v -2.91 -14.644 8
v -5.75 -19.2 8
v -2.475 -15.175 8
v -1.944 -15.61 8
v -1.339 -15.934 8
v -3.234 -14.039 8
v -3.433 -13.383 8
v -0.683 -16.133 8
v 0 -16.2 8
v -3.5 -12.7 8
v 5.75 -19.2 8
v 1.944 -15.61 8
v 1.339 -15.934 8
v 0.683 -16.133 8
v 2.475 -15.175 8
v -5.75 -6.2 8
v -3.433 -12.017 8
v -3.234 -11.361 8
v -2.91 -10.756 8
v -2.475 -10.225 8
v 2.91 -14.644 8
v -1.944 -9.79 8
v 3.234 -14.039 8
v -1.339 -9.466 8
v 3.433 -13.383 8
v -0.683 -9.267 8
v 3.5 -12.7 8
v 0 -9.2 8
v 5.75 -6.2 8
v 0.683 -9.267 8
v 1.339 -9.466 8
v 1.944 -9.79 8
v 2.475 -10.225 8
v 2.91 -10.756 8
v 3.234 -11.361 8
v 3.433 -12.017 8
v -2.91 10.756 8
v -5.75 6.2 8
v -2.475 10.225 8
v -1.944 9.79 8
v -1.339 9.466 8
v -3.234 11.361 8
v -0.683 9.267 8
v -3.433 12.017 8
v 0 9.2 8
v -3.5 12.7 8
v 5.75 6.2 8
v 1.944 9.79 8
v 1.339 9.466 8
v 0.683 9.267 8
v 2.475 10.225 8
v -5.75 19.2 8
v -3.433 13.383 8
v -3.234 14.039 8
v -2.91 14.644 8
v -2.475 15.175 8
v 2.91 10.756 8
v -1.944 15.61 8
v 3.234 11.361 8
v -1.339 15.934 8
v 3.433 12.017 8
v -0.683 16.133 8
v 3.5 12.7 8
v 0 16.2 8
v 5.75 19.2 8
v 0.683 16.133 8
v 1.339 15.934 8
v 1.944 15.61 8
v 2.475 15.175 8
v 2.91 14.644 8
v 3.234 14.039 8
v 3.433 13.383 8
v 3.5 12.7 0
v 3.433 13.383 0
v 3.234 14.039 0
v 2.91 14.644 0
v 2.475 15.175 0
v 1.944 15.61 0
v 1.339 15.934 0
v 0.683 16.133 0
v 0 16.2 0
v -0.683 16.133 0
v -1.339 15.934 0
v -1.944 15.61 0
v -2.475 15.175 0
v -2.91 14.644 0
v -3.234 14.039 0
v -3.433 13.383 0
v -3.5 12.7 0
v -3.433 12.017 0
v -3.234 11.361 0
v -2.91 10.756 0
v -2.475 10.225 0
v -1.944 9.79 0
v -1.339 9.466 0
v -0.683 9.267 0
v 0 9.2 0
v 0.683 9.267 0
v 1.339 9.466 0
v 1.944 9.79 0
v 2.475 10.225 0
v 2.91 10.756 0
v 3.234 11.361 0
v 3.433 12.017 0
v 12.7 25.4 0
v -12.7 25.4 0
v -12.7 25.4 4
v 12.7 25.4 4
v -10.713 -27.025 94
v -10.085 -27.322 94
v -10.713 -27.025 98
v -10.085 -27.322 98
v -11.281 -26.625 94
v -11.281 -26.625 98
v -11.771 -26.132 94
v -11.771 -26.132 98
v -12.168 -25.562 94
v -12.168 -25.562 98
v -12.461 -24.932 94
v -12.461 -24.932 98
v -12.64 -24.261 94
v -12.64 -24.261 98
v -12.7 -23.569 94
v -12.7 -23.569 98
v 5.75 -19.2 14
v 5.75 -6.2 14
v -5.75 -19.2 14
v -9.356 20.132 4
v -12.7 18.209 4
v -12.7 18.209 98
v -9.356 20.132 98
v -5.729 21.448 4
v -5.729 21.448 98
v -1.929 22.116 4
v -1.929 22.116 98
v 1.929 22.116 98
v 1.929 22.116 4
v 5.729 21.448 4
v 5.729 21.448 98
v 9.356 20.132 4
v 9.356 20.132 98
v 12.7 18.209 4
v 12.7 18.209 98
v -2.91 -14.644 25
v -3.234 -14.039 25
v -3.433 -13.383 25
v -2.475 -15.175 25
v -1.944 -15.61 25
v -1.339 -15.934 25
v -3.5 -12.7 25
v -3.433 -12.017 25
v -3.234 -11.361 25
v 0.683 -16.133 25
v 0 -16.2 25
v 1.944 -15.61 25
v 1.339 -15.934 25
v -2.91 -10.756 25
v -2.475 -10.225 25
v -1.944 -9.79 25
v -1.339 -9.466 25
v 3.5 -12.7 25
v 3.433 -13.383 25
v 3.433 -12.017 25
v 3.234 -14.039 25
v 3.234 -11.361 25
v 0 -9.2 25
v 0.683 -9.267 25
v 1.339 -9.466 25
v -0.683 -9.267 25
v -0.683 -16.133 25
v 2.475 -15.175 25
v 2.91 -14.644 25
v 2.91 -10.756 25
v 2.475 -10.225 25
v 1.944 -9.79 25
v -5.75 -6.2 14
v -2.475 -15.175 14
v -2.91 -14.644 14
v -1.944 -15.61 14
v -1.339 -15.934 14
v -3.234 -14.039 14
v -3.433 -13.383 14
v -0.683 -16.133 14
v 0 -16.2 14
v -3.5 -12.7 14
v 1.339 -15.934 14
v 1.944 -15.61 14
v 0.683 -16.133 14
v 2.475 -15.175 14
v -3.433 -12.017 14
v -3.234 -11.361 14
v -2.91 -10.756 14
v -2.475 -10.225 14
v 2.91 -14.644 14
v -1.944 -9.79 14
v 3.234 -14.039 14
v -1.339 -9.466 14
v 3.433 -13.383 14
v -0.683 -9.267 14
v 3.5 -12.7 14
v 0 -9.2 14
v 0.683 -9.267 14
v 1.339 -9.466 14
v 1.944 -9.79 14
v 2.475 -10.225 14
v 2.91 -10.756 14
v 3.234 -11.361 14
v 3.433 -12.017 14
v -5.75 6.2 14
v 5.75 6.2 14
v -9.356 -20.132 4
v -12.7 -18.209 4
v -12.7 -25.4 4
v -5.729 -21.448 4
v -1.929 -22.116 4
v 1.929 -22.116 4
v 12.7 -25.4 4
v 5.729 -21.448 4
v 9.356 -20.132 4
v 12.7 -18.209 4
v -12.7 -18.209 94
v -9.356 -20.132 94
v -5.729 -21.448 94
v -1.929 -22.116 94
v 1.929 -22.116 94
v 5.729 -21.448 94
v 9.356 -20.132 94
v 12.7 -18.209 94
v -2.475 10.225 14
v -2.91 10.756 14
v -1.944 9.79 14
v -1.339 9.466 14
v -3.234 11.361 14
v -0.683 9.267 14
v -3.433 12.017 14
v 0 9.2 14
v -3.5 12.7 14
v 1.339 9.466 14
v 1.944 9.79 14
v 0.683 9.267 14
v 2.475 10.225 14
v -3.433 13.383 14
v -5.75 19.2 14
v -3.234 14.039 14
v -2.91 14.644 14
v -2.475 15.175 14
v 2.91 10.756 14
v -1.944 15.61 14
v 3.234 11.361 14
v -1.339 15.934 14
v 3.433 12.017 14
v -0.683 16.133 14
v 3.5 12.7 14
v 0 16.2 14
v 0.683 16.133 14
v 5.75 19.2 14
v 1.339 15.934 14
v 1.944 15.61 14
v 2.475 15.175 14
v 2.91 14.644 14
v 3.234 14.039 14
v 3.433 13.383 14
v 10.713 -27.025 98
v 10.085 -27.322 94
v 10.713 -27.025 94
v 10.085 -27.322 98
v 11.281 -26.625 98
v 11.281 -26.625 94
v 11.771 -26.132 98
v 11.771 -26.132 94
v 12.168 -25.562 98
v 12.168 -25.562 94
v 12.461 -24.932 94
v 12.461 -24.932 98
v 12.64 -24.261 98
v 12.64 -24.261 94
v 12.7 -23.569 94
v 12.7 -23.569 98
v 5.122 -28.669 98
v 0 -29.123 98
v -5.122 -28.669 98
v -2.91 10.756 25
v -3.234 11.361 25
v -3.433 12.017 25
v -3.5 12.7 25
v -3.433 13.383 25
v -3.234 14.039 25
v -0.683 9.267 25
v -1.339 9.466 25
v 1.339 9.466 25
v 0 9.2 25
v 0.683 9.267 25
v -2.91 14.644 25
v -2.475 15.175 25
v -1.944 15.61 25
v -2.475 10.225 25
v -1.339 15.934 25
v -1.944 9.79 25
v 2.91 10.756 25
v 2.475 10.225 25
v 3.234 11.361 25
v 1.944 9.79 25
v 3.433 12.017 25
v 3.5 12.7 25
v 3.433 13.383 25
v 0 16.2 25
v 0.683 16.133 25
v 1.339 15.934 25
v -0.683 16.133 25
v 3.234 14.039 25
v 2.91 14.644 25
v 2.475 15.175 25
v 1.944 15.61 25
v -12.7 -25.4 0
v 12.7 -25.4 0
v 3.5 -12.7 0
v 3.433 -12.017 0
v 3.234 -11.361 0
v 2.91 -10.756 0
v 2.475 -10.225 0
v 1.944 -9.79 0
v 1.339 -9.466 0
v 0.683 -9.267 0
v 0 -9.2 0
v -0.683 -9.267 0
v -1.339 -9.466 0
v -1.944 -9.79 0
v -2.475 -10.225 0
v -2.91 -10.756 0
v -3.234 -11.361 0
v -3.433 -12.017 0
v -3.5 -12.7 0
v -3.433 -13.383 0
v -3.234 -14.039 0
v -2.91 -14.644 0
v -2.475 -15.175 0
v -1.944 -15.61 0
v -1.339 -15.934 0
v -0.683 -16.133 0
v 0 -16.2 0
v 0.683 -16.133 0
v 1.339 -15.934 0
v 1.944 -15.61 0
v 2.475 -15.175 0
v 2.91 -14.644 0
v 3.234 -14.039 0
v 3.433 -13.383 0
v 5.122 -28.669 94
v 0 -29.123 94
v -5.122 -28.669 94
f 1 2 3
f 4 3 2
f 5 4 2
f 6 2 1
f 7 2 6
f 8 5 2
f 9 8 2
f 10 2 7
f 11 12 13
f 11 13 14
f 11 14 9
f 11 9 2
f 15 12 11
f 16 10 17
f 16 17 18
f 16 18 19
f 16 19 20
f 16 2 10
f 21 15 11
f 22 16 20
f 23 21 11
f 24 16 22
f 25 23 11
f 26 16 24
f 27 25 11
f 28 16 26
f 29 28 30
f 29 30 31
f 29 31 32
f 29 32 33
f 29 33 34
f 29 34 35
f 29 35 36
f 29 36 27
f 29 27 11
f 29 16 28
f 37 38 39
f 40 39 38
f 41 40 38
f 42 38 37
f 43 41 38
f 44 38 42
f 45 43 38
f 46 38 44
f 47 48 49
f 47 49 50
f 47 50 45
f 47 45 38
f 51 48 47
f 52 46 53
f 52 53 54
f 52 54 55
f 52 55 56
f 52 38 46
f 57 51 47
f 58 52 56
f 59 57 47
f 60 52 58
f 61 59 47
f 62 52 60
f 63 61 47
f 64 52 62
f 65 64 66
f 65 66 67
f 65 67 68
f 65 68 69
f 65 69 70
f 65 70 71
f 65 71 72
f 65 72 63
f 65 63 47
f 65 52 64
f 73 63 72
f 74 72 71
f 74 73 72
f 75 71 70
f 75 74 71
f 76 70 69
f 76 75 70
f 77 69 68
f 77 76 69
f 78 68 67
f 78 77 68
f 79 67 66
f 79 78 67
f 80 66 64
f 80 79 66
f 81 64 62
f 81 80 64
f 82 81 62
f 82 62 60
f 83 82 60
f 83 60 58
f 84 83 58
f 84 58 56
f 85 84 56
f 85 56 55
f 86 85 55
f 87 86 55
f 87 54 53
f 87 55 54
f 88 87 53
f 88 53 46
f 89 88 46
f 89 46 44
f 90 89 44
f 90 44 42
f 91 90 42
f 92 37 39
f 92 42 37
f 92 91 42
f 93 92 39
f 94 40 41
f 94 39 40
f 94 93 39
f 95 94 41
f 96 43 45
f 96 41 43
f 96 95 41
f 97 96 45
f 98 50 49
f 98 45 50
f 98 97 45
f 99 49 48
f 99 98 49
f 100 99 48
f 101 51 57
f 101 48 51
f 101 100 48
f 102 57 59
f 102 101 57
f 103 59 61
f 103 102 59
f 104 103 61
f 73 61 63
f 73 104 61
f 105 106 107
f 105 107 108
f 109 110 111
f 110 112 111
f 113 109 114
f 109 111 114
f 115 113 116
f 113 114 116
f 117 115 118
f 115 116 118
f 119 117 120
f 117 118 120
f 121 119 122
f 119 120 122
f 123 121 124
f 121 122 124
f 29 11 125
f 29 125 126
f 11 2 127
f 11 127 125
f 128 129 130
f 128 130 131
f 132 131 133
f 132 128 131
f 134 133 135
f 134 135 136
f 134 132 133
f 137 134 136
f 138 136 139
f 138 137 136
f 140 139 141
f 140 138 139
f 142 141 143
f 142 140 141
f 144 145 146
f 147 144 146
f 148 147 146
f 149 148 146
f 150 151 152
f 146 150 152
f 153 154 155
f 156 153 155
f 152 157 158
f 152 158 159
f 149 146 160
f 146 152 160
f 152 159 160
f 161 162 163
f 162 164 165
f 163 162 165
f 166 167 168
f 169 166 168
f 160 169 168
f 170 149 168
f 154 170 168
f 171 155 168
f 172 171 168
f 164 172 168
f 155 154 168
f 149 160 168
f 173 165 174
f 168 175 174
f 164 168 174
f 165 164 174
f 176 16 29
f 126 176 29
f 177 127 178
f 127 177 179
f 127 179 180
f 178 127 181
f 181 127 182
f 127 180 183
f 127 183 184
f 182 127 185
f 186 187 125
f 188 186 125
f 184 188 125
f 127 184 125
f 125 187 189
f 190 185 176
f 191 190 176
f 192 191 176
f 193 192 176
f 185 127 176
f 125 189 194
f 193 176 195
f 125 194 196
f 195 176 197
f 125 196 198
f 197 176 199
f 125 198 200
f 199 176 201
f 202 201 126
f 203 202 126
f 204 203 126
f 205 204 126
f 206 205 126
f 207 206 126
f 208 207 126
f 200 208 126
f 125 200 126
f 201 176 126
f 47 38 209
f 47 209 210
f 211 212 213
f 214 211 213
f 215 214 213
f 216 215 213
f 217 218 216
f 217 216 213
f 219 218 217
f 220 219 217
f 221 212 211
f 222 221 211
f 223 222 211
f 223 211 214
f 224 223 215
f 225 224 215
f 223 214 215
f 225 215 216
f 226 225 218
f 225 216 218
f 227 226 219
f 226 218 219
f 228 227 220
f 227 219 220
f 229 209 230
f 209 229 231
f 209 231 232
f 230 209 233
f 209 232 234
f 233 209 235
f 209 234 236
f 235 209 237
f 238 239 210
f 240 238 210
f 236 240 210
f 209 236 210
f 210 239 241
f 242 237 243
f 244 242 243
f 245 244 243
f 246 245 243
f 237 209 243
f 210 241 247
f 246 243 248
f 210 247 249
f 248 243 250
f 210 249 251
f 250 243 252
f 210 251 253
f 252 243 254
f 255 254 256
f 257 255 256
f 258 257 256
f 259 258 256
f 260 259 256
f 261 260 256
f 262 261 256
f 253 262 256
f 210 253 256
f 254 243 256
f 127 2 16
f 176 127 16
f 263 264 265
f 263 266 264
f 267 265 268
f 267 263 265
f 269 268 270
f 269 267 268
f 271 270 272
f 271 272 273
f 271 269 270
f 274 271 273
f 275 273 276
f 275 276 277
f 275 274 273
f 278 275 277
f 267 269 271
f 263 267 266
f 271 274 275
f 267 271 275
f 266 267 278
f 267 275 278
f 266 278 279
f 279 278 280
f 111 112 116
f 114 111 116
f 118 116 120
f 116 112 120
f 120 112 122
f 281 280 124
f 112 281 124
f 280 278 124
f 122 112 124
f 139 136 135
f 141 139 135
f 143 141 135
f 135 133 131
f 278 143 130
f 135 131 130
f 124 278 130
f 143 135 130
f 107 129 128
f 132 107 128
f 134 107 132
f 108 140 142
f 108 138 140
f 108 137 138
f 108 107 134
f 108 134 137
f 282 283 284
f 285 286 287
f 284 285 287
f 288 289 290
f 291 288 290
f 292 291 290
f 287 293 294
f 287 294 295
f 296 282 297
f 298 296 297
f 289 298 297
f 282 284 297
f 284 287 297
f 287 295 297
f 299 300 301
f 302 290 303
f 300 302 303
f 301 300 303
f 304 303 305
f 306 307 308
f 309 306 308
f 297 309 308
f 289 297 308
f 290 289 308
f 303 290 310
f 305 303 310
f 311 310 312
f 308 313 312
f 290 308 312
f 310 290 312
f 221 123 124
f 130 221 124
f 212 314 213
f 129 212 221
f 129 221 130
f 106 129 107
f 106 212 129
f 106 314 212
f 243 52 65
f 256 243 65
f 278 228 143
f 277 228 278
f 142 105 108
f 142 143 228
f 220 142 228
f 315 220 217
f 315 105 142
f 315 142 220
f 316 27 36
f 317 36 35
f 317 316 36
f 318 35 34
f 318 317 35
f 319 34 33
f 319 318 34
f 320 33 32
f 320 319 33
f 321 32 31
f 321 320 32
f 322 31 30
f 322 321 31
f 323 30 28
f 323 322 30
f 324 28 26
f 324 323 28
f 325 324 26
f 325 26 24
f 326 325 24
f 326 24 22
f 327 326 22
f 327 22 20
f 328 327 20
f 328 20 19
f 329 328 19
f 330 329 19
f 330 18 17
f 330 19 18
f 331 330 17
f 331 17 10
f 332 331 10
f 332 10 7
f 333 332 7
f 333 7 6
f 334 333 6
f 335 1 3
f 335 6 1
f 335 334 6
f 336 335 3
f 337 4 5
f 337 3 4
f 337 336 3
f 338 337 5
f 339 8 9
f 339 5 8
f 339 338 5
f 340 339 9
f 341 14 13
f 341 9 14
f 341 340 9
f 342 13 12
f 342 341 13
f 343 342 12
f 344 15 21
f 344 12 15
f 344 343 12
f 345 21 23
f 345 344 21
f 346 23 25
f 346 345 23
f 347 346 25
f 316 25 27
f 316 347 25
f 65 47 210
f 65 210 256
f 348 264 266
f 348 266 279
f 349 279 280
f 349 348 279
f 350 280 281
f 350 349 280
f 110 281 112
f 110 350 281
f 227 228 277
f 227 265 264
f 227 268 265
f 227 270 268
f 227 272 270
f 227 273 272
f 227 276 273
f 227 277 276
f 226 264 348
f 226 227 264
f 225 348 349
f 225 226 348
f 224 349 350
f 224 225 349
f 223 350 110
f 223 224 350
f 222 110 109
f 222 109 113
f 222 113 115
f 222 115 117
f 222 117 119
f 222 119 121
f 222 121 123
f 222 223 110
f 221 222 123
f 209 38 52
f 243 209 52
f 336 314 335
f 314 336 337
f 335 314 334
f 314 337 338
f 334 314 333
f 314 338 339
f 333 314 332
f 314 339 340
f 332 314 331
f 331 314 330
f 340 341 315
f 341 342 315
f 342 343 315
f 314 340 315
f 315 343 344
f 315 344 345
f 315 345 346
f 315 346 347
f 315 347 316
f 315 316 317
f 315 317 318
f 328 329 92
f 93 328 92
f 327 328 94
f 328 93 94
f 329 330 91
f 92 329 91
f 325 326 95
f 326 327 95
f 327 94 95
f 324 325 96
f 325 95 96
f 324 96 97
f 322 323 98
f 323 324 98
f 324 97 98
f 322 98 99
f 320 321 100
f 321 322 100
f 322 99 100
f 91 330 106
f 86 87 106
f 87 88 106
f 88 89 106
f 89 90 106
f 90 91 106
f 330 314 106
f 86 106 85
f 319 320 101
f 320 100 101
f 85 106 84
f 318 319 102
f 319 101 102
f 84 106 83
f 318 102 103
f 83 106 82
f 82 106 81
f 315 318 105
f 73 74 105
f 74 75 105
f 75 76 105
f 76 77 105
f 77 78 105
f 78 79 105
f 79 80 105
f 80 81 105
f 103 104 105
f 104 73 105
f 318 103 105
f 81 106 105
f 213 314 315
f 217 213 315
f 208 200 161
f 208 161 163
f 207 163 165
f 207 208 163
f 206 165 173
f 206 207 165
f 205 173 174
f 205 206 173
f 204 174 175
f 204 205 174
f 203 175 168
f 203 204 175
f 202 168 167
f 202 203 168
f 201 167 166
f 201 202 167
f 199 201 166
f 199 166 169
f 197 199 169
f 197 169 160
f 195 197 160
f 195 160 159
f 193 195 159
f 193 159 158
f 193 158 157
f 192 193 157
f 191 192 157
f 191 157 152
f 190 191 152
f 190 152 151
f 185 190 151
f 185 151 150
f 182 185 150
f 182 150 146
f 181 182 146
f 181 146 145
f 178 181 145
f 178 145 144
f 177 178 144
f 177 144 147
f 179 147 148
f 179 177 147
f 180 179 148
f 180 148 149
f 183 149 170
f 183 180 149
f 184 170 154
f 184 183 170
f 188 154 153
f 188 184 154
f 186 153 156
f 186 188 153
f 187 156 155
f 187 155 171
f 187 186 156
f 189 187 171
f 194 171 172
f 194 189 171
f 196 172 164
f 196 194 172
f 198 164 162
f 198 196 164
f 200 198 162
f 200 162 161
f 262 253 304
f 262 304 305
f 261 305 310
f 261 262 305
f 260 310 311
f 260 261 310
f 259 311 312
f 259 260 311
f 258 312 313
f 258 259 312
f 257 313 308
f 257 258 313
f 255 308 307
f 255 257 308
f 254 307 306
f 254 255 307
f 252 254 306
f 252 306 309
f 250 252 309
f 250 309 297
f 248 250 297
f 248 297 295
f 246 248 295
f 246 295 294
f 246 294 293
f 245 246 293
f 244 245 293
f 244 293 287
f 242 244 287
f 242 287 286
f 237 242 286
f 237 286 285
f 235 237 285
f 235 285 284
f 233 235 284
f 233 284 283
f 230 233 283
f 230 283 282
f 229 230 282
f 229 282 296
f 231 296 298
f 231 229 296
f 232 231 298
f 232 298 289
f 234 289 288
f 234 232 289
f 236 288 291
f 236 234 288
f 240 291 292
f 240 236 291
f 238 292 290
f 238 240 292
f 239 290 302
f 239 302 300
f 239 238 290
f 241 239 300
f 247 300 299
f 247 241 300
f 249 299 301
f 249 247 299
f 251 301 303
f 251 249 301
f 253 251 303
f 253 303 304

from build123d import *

# Parameters (mm, degrees)
SKETCH2_W           = 25.4
SKETCH2_H           = 50.8
SKETCH2_R           = 3.5
BOSS_EXTRUDE4_DEPTH = 4
BOSS_EXTRUDE5_START = 4
BOSS_EXTRUDE5_DEPTH = 90
CUT_EXTRUDE2_START  = 8
SKETCH2_6_W         = 11.5
SKETCH2_6_H         = 13
CUT_EXTRUDE2_DEPTH  = 6
SKETCH2_7_R         = 3.5
CUT_EXTRUDE3_DEPTH  = 25
BOSS_EXTRUDE6_DEPTH = 4
FILLET1_R           = 4


with BuildPart() as part:
    # Sketch2 → Boss-Extrude4 (new body)
    with BuildSketch(Plane.XY):
        Rectangle(SKETCH2_W, SKETCH2_H)
        with Locations((0, 12.7)):
            Circle(SKETCH2_R, mode=Mode.SUBTRACT)
        with Locations((0, -12.7)):
            Circle(SKETCH2_R, mode=Mode.SUBTRACT)
    extrude(amount=BOSS_EXTRUDE4_DEPTH)

    # Sketch2<4> → Boss-Extrude5 (add)
    with BuildSketch(Plane.XY.offset(BOSS_EXTRUDE5_START)):
        with BuildLine():
            Line((12.7, -12.7), (5.75, -12.7))
            Line((5.75, -12.7), (5.75, -19.2))
            Line((5.75, -19.2), (-5.75, -19.2))
            Line((-5.75, -19.2), (-5.75, -12.7))
            Line((-5.75, -12.7), (-12.7, -12.7))
            Line((-12.7, -12.7), (-12.7, -18.208514492))
            ThreePointArc((-12.7, -18.208514492), (0, -22.2), (12.7, -18.208514492))
            Line((12.7, -18.208514492), (12.7, -12.7))
        make_face()
        with BuildLine():
            Line((5.75, -19.2), (5.75, -12.7))
            Line((5.75, -12.7), (3.5, -12.7))
            ThreePointArc((3.5, -12.7), (0, -16.2), (-3.5, -12.7))
            Line((-3.5, -12.7), (-5.75, -12.7))
            Line((-5.75, -12.7), (-5.75, -19.2))
            Line((-5.75, -19.2), (5.75, -19.2))
        make_face()
        with BuildLine():
            Line((5.75, -12.7), (5.75, -6.2))
            Line((5.75, -6.2), (-5.75, -6.2))
            Line((-5.75, -6.2), (-5.75, -12.7))
            Line((-5.75, -12.7), (-3.5, -12.7))
            ThreePointArc((-3.5, -12.7), (0, -9.2), (3.5, -12.7))
            Line((3.5, -12.7), (5.75, -12.7))
        make_face()
        with BuildLine():
            ThreePointArc((-3.5, -12.7), (0, -16.2), (3.5, -12.7))
            Line((3.5, -12.7), (-3.5, -12.7))
        make_face()
        with BuildLine():
            Line((-3.5, -12.7), (3.5, -12.7))
            ThreePointArc((3.5, -12.7), (0, -9.2), (-3.5, -12.7))
        make_face()
        with BuildLine():
            ThreePointArc((-3.5, 12.7), (0, 9.2), (3.5, 12.7))
            Line((3.5, 12.7), (-3.5, 12.7))
        make_face()
        with BuildLine():
            Line((-3.5, 12.7), (3.5, 12.7))
            ThreePointArc((3.5, 12.7), (0, 16.2), (-3.5, 12.7))
        make_face()
        with BuildLine():
            Line((3.5, 12.7), (5.75, 12.7))
            Line((5.75, 12.7), (5.75, 19.2))
            Line((5.75, 19.2), (-5.75, 19.2))
            Line((-5.75, 19.2), (-5.75, 12.7))
            Line((-5.75, 12.7), (-3.5, 12.7))
            ThreePointArc((-3.5, 12.7), (0, 16.2), (3.5, 12.7))
        make_face()
        with BuildLine():
            Line((5.75, 6.2), (5.75, 12.7))
            Line((5.75, 12.7), (3.5, 12.7))
            ThreePointArc((3.5, 12.7), (0, 9.2), (-3.5, 12.7))
            Line((-3.5, 12.7), (-5.75, 12.7))
            Line((-5.75, 12.7), (-5.75, 6.2))
            Line((-5.75, 6.2), (5.75, 6.2))
        make_face()
        Polygon((-5.75, -6.2), (5.75, -6.2), (5.75, -12.7), (12.7, -12.7), (12.7, 12.7), (5.75, 12.7), (5.75, 6.2), (-5.75, 6.2), (-5.75, 12.7), (-12.7, 12.7), (-12.7, -12.7), (-5.75, -12.7), align=None)
        with BuildLine():
            Line((5.75, 12.7), (12.7, 12.7))
            Line((12.7, 12.7), (12.7, 18.208514492))
            ThreePointArc((12.7, 18.208514492), (0, 22.2), (-12.7, 18.208514492))
            Line((-12.7, 18.208514492), (-12.7, 12.7))
            Line((-12.7, 12.7), (-5.75, 12.7))
            Line((-5.75, 12.7), (-5.75, 19.2))
            Line((-5.75, 19.2), (5.75, 19.2))
            Line((5.75, 19.2), (5.75, 12.7))
        make_face()
    extrude(amount=BOSS_EXTRUDE5_DEPTH)

    # Sketch2<6> → Cut-Extrude2 (cut)
    with BuildSketch(Plane.XY.offset(CUT_EXTRUDE2_START)):
        with Locations((0, -12.7)):
            Rectangle(SKETCH2_6_W, SKETCH2_6_H)
        with Locations((0, 12.7)):
            Rectangle(SKETCH2_6_W, SKETCH2_6_H)
    extrude(amount=CUT_EXTRUDE2_DEPTH, mode=Mode.SUBTRACT)

    # Sketch2<7> → Cut-Extrude3 (cut)
    with BuildSketch(Plane.XY):
        with Locations((0, 12.7)):
            Circle(SKETCH2_7_R)
        with Locations((0, -12.7)):
            Circle(SKETCH2_7_R)
    extrude(amount=CUT_EXTRUDE3_DEPTH, mode=Mode.SUBTRACT)

    # Sketch3 → Boss-Extrude6 (add)
    with BuildSketch(Plane.XY.offset(94)):
        with BuildLine():
            Line((12.7, -18.208514492), (12.7, -26.208514492))
            ThreePointArc((12.7, -26.208514492), (0, -29.123465314), (-12.7, -26.208514492))
            Line((-12.7, -26.208514492), (-12.7, -18.208514492))
            Line((-12.7, -18.208514492), (-12.7, 18.208514492))
            ThreePointArc((-12.7, 18.208514492), (0, 22.2), (12.7, 18.208514492))
            Line((12.7, 18.208514492), (12.7, -18.208514492))
        make_face()
    extrude(amount=BOSS_EXTRUDE6_DEPTH)

    # Fillet1
    fillet1_edges = [part.edges().sort_by_distance(p)[0] for p in [
        (12.7, -26.208514492, 96),
        (-12.7, -26.208514492, 96),
    ]]
    fillet(fillet1_edges, radius=FILLET1_R)


solid = part.part
